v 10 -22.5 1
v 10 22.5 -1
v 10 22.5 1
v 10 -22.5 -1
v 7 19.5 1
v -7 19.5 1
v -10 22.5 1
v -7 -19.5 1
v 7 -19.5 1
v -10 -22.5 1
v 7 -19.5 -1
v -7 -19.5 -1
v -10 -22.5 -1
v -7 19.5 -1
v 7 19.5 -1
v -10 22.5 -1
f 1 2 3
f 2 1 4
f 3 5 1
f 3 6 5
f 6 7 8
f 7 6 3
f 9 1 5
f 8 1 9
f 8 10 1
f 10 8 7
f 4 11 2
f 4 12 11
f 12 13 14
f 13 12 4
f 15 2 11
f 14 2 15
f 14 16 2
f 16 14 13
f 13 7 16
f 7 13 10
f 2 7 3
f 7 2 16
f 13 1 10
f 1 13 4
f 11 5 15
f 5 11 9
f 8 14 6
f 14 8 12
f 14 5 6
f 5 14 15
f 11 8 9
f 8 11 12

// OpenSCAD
echo("Работа Асыловой Анастасии!");

w_back = 70;
h_back = 45;
w_controller = 20;
thickness_bottom = 2;
thickness_walls = 2;
thickness_top = 2;
h_walls = 4;
gap_backlight = 1.5;
width_frame_window = 3;

//kit_controller();
//walls();
//debug_controller();
frame_controller();

module frame_controller(){
    difference(){
        cube([w_controller, h_back, thickness_top], center=true);
        color("red")
        cube([w_controller-2*width_frame_window, h_back-2*width_frame_window, thickness_top+1], center=true);
    }
}

module debug_controller() {
    difference(){
        kit_controller();
        translate([-w_controller/2, 0, h_walls/2])
        color("green")
        cube([w_controller, h_back+2*thickness_walls+1+gap_backlight, h_walls*2], center = true);
    }
}


module kit_controller(){
    controller();
    translate([0, 0, h_walls/2])
    walls();
    color("purple")
    translate([0, 0, thickness_bottom])
    frame_controller();
}
module walls(){
    difference(){
        cube([w_controller+2*thickness_walls+gap_backlight, h_back+2*thickness_walls+gap_backlight, thickness_bottom+h_walls], center=true);
        color("red")
        cube([w_controller+gap_backlight, h_back+gap_backlight, thickness_bottom+h_walls+1], center=true);
        translate([-w_controller - thickness_walls+gap_backlight/2-0.25, 0, 0])
        cube([w_controller+gap_backlight, h_back+gap_backlight+2*thickness_walls+1, thickness_bottom+h_walls+1], center=true);
    }
}

module controller(){
    cube([w_controller+gap_backlight, h_back+gap_backlight, thickness_bottom], center=true);
}
